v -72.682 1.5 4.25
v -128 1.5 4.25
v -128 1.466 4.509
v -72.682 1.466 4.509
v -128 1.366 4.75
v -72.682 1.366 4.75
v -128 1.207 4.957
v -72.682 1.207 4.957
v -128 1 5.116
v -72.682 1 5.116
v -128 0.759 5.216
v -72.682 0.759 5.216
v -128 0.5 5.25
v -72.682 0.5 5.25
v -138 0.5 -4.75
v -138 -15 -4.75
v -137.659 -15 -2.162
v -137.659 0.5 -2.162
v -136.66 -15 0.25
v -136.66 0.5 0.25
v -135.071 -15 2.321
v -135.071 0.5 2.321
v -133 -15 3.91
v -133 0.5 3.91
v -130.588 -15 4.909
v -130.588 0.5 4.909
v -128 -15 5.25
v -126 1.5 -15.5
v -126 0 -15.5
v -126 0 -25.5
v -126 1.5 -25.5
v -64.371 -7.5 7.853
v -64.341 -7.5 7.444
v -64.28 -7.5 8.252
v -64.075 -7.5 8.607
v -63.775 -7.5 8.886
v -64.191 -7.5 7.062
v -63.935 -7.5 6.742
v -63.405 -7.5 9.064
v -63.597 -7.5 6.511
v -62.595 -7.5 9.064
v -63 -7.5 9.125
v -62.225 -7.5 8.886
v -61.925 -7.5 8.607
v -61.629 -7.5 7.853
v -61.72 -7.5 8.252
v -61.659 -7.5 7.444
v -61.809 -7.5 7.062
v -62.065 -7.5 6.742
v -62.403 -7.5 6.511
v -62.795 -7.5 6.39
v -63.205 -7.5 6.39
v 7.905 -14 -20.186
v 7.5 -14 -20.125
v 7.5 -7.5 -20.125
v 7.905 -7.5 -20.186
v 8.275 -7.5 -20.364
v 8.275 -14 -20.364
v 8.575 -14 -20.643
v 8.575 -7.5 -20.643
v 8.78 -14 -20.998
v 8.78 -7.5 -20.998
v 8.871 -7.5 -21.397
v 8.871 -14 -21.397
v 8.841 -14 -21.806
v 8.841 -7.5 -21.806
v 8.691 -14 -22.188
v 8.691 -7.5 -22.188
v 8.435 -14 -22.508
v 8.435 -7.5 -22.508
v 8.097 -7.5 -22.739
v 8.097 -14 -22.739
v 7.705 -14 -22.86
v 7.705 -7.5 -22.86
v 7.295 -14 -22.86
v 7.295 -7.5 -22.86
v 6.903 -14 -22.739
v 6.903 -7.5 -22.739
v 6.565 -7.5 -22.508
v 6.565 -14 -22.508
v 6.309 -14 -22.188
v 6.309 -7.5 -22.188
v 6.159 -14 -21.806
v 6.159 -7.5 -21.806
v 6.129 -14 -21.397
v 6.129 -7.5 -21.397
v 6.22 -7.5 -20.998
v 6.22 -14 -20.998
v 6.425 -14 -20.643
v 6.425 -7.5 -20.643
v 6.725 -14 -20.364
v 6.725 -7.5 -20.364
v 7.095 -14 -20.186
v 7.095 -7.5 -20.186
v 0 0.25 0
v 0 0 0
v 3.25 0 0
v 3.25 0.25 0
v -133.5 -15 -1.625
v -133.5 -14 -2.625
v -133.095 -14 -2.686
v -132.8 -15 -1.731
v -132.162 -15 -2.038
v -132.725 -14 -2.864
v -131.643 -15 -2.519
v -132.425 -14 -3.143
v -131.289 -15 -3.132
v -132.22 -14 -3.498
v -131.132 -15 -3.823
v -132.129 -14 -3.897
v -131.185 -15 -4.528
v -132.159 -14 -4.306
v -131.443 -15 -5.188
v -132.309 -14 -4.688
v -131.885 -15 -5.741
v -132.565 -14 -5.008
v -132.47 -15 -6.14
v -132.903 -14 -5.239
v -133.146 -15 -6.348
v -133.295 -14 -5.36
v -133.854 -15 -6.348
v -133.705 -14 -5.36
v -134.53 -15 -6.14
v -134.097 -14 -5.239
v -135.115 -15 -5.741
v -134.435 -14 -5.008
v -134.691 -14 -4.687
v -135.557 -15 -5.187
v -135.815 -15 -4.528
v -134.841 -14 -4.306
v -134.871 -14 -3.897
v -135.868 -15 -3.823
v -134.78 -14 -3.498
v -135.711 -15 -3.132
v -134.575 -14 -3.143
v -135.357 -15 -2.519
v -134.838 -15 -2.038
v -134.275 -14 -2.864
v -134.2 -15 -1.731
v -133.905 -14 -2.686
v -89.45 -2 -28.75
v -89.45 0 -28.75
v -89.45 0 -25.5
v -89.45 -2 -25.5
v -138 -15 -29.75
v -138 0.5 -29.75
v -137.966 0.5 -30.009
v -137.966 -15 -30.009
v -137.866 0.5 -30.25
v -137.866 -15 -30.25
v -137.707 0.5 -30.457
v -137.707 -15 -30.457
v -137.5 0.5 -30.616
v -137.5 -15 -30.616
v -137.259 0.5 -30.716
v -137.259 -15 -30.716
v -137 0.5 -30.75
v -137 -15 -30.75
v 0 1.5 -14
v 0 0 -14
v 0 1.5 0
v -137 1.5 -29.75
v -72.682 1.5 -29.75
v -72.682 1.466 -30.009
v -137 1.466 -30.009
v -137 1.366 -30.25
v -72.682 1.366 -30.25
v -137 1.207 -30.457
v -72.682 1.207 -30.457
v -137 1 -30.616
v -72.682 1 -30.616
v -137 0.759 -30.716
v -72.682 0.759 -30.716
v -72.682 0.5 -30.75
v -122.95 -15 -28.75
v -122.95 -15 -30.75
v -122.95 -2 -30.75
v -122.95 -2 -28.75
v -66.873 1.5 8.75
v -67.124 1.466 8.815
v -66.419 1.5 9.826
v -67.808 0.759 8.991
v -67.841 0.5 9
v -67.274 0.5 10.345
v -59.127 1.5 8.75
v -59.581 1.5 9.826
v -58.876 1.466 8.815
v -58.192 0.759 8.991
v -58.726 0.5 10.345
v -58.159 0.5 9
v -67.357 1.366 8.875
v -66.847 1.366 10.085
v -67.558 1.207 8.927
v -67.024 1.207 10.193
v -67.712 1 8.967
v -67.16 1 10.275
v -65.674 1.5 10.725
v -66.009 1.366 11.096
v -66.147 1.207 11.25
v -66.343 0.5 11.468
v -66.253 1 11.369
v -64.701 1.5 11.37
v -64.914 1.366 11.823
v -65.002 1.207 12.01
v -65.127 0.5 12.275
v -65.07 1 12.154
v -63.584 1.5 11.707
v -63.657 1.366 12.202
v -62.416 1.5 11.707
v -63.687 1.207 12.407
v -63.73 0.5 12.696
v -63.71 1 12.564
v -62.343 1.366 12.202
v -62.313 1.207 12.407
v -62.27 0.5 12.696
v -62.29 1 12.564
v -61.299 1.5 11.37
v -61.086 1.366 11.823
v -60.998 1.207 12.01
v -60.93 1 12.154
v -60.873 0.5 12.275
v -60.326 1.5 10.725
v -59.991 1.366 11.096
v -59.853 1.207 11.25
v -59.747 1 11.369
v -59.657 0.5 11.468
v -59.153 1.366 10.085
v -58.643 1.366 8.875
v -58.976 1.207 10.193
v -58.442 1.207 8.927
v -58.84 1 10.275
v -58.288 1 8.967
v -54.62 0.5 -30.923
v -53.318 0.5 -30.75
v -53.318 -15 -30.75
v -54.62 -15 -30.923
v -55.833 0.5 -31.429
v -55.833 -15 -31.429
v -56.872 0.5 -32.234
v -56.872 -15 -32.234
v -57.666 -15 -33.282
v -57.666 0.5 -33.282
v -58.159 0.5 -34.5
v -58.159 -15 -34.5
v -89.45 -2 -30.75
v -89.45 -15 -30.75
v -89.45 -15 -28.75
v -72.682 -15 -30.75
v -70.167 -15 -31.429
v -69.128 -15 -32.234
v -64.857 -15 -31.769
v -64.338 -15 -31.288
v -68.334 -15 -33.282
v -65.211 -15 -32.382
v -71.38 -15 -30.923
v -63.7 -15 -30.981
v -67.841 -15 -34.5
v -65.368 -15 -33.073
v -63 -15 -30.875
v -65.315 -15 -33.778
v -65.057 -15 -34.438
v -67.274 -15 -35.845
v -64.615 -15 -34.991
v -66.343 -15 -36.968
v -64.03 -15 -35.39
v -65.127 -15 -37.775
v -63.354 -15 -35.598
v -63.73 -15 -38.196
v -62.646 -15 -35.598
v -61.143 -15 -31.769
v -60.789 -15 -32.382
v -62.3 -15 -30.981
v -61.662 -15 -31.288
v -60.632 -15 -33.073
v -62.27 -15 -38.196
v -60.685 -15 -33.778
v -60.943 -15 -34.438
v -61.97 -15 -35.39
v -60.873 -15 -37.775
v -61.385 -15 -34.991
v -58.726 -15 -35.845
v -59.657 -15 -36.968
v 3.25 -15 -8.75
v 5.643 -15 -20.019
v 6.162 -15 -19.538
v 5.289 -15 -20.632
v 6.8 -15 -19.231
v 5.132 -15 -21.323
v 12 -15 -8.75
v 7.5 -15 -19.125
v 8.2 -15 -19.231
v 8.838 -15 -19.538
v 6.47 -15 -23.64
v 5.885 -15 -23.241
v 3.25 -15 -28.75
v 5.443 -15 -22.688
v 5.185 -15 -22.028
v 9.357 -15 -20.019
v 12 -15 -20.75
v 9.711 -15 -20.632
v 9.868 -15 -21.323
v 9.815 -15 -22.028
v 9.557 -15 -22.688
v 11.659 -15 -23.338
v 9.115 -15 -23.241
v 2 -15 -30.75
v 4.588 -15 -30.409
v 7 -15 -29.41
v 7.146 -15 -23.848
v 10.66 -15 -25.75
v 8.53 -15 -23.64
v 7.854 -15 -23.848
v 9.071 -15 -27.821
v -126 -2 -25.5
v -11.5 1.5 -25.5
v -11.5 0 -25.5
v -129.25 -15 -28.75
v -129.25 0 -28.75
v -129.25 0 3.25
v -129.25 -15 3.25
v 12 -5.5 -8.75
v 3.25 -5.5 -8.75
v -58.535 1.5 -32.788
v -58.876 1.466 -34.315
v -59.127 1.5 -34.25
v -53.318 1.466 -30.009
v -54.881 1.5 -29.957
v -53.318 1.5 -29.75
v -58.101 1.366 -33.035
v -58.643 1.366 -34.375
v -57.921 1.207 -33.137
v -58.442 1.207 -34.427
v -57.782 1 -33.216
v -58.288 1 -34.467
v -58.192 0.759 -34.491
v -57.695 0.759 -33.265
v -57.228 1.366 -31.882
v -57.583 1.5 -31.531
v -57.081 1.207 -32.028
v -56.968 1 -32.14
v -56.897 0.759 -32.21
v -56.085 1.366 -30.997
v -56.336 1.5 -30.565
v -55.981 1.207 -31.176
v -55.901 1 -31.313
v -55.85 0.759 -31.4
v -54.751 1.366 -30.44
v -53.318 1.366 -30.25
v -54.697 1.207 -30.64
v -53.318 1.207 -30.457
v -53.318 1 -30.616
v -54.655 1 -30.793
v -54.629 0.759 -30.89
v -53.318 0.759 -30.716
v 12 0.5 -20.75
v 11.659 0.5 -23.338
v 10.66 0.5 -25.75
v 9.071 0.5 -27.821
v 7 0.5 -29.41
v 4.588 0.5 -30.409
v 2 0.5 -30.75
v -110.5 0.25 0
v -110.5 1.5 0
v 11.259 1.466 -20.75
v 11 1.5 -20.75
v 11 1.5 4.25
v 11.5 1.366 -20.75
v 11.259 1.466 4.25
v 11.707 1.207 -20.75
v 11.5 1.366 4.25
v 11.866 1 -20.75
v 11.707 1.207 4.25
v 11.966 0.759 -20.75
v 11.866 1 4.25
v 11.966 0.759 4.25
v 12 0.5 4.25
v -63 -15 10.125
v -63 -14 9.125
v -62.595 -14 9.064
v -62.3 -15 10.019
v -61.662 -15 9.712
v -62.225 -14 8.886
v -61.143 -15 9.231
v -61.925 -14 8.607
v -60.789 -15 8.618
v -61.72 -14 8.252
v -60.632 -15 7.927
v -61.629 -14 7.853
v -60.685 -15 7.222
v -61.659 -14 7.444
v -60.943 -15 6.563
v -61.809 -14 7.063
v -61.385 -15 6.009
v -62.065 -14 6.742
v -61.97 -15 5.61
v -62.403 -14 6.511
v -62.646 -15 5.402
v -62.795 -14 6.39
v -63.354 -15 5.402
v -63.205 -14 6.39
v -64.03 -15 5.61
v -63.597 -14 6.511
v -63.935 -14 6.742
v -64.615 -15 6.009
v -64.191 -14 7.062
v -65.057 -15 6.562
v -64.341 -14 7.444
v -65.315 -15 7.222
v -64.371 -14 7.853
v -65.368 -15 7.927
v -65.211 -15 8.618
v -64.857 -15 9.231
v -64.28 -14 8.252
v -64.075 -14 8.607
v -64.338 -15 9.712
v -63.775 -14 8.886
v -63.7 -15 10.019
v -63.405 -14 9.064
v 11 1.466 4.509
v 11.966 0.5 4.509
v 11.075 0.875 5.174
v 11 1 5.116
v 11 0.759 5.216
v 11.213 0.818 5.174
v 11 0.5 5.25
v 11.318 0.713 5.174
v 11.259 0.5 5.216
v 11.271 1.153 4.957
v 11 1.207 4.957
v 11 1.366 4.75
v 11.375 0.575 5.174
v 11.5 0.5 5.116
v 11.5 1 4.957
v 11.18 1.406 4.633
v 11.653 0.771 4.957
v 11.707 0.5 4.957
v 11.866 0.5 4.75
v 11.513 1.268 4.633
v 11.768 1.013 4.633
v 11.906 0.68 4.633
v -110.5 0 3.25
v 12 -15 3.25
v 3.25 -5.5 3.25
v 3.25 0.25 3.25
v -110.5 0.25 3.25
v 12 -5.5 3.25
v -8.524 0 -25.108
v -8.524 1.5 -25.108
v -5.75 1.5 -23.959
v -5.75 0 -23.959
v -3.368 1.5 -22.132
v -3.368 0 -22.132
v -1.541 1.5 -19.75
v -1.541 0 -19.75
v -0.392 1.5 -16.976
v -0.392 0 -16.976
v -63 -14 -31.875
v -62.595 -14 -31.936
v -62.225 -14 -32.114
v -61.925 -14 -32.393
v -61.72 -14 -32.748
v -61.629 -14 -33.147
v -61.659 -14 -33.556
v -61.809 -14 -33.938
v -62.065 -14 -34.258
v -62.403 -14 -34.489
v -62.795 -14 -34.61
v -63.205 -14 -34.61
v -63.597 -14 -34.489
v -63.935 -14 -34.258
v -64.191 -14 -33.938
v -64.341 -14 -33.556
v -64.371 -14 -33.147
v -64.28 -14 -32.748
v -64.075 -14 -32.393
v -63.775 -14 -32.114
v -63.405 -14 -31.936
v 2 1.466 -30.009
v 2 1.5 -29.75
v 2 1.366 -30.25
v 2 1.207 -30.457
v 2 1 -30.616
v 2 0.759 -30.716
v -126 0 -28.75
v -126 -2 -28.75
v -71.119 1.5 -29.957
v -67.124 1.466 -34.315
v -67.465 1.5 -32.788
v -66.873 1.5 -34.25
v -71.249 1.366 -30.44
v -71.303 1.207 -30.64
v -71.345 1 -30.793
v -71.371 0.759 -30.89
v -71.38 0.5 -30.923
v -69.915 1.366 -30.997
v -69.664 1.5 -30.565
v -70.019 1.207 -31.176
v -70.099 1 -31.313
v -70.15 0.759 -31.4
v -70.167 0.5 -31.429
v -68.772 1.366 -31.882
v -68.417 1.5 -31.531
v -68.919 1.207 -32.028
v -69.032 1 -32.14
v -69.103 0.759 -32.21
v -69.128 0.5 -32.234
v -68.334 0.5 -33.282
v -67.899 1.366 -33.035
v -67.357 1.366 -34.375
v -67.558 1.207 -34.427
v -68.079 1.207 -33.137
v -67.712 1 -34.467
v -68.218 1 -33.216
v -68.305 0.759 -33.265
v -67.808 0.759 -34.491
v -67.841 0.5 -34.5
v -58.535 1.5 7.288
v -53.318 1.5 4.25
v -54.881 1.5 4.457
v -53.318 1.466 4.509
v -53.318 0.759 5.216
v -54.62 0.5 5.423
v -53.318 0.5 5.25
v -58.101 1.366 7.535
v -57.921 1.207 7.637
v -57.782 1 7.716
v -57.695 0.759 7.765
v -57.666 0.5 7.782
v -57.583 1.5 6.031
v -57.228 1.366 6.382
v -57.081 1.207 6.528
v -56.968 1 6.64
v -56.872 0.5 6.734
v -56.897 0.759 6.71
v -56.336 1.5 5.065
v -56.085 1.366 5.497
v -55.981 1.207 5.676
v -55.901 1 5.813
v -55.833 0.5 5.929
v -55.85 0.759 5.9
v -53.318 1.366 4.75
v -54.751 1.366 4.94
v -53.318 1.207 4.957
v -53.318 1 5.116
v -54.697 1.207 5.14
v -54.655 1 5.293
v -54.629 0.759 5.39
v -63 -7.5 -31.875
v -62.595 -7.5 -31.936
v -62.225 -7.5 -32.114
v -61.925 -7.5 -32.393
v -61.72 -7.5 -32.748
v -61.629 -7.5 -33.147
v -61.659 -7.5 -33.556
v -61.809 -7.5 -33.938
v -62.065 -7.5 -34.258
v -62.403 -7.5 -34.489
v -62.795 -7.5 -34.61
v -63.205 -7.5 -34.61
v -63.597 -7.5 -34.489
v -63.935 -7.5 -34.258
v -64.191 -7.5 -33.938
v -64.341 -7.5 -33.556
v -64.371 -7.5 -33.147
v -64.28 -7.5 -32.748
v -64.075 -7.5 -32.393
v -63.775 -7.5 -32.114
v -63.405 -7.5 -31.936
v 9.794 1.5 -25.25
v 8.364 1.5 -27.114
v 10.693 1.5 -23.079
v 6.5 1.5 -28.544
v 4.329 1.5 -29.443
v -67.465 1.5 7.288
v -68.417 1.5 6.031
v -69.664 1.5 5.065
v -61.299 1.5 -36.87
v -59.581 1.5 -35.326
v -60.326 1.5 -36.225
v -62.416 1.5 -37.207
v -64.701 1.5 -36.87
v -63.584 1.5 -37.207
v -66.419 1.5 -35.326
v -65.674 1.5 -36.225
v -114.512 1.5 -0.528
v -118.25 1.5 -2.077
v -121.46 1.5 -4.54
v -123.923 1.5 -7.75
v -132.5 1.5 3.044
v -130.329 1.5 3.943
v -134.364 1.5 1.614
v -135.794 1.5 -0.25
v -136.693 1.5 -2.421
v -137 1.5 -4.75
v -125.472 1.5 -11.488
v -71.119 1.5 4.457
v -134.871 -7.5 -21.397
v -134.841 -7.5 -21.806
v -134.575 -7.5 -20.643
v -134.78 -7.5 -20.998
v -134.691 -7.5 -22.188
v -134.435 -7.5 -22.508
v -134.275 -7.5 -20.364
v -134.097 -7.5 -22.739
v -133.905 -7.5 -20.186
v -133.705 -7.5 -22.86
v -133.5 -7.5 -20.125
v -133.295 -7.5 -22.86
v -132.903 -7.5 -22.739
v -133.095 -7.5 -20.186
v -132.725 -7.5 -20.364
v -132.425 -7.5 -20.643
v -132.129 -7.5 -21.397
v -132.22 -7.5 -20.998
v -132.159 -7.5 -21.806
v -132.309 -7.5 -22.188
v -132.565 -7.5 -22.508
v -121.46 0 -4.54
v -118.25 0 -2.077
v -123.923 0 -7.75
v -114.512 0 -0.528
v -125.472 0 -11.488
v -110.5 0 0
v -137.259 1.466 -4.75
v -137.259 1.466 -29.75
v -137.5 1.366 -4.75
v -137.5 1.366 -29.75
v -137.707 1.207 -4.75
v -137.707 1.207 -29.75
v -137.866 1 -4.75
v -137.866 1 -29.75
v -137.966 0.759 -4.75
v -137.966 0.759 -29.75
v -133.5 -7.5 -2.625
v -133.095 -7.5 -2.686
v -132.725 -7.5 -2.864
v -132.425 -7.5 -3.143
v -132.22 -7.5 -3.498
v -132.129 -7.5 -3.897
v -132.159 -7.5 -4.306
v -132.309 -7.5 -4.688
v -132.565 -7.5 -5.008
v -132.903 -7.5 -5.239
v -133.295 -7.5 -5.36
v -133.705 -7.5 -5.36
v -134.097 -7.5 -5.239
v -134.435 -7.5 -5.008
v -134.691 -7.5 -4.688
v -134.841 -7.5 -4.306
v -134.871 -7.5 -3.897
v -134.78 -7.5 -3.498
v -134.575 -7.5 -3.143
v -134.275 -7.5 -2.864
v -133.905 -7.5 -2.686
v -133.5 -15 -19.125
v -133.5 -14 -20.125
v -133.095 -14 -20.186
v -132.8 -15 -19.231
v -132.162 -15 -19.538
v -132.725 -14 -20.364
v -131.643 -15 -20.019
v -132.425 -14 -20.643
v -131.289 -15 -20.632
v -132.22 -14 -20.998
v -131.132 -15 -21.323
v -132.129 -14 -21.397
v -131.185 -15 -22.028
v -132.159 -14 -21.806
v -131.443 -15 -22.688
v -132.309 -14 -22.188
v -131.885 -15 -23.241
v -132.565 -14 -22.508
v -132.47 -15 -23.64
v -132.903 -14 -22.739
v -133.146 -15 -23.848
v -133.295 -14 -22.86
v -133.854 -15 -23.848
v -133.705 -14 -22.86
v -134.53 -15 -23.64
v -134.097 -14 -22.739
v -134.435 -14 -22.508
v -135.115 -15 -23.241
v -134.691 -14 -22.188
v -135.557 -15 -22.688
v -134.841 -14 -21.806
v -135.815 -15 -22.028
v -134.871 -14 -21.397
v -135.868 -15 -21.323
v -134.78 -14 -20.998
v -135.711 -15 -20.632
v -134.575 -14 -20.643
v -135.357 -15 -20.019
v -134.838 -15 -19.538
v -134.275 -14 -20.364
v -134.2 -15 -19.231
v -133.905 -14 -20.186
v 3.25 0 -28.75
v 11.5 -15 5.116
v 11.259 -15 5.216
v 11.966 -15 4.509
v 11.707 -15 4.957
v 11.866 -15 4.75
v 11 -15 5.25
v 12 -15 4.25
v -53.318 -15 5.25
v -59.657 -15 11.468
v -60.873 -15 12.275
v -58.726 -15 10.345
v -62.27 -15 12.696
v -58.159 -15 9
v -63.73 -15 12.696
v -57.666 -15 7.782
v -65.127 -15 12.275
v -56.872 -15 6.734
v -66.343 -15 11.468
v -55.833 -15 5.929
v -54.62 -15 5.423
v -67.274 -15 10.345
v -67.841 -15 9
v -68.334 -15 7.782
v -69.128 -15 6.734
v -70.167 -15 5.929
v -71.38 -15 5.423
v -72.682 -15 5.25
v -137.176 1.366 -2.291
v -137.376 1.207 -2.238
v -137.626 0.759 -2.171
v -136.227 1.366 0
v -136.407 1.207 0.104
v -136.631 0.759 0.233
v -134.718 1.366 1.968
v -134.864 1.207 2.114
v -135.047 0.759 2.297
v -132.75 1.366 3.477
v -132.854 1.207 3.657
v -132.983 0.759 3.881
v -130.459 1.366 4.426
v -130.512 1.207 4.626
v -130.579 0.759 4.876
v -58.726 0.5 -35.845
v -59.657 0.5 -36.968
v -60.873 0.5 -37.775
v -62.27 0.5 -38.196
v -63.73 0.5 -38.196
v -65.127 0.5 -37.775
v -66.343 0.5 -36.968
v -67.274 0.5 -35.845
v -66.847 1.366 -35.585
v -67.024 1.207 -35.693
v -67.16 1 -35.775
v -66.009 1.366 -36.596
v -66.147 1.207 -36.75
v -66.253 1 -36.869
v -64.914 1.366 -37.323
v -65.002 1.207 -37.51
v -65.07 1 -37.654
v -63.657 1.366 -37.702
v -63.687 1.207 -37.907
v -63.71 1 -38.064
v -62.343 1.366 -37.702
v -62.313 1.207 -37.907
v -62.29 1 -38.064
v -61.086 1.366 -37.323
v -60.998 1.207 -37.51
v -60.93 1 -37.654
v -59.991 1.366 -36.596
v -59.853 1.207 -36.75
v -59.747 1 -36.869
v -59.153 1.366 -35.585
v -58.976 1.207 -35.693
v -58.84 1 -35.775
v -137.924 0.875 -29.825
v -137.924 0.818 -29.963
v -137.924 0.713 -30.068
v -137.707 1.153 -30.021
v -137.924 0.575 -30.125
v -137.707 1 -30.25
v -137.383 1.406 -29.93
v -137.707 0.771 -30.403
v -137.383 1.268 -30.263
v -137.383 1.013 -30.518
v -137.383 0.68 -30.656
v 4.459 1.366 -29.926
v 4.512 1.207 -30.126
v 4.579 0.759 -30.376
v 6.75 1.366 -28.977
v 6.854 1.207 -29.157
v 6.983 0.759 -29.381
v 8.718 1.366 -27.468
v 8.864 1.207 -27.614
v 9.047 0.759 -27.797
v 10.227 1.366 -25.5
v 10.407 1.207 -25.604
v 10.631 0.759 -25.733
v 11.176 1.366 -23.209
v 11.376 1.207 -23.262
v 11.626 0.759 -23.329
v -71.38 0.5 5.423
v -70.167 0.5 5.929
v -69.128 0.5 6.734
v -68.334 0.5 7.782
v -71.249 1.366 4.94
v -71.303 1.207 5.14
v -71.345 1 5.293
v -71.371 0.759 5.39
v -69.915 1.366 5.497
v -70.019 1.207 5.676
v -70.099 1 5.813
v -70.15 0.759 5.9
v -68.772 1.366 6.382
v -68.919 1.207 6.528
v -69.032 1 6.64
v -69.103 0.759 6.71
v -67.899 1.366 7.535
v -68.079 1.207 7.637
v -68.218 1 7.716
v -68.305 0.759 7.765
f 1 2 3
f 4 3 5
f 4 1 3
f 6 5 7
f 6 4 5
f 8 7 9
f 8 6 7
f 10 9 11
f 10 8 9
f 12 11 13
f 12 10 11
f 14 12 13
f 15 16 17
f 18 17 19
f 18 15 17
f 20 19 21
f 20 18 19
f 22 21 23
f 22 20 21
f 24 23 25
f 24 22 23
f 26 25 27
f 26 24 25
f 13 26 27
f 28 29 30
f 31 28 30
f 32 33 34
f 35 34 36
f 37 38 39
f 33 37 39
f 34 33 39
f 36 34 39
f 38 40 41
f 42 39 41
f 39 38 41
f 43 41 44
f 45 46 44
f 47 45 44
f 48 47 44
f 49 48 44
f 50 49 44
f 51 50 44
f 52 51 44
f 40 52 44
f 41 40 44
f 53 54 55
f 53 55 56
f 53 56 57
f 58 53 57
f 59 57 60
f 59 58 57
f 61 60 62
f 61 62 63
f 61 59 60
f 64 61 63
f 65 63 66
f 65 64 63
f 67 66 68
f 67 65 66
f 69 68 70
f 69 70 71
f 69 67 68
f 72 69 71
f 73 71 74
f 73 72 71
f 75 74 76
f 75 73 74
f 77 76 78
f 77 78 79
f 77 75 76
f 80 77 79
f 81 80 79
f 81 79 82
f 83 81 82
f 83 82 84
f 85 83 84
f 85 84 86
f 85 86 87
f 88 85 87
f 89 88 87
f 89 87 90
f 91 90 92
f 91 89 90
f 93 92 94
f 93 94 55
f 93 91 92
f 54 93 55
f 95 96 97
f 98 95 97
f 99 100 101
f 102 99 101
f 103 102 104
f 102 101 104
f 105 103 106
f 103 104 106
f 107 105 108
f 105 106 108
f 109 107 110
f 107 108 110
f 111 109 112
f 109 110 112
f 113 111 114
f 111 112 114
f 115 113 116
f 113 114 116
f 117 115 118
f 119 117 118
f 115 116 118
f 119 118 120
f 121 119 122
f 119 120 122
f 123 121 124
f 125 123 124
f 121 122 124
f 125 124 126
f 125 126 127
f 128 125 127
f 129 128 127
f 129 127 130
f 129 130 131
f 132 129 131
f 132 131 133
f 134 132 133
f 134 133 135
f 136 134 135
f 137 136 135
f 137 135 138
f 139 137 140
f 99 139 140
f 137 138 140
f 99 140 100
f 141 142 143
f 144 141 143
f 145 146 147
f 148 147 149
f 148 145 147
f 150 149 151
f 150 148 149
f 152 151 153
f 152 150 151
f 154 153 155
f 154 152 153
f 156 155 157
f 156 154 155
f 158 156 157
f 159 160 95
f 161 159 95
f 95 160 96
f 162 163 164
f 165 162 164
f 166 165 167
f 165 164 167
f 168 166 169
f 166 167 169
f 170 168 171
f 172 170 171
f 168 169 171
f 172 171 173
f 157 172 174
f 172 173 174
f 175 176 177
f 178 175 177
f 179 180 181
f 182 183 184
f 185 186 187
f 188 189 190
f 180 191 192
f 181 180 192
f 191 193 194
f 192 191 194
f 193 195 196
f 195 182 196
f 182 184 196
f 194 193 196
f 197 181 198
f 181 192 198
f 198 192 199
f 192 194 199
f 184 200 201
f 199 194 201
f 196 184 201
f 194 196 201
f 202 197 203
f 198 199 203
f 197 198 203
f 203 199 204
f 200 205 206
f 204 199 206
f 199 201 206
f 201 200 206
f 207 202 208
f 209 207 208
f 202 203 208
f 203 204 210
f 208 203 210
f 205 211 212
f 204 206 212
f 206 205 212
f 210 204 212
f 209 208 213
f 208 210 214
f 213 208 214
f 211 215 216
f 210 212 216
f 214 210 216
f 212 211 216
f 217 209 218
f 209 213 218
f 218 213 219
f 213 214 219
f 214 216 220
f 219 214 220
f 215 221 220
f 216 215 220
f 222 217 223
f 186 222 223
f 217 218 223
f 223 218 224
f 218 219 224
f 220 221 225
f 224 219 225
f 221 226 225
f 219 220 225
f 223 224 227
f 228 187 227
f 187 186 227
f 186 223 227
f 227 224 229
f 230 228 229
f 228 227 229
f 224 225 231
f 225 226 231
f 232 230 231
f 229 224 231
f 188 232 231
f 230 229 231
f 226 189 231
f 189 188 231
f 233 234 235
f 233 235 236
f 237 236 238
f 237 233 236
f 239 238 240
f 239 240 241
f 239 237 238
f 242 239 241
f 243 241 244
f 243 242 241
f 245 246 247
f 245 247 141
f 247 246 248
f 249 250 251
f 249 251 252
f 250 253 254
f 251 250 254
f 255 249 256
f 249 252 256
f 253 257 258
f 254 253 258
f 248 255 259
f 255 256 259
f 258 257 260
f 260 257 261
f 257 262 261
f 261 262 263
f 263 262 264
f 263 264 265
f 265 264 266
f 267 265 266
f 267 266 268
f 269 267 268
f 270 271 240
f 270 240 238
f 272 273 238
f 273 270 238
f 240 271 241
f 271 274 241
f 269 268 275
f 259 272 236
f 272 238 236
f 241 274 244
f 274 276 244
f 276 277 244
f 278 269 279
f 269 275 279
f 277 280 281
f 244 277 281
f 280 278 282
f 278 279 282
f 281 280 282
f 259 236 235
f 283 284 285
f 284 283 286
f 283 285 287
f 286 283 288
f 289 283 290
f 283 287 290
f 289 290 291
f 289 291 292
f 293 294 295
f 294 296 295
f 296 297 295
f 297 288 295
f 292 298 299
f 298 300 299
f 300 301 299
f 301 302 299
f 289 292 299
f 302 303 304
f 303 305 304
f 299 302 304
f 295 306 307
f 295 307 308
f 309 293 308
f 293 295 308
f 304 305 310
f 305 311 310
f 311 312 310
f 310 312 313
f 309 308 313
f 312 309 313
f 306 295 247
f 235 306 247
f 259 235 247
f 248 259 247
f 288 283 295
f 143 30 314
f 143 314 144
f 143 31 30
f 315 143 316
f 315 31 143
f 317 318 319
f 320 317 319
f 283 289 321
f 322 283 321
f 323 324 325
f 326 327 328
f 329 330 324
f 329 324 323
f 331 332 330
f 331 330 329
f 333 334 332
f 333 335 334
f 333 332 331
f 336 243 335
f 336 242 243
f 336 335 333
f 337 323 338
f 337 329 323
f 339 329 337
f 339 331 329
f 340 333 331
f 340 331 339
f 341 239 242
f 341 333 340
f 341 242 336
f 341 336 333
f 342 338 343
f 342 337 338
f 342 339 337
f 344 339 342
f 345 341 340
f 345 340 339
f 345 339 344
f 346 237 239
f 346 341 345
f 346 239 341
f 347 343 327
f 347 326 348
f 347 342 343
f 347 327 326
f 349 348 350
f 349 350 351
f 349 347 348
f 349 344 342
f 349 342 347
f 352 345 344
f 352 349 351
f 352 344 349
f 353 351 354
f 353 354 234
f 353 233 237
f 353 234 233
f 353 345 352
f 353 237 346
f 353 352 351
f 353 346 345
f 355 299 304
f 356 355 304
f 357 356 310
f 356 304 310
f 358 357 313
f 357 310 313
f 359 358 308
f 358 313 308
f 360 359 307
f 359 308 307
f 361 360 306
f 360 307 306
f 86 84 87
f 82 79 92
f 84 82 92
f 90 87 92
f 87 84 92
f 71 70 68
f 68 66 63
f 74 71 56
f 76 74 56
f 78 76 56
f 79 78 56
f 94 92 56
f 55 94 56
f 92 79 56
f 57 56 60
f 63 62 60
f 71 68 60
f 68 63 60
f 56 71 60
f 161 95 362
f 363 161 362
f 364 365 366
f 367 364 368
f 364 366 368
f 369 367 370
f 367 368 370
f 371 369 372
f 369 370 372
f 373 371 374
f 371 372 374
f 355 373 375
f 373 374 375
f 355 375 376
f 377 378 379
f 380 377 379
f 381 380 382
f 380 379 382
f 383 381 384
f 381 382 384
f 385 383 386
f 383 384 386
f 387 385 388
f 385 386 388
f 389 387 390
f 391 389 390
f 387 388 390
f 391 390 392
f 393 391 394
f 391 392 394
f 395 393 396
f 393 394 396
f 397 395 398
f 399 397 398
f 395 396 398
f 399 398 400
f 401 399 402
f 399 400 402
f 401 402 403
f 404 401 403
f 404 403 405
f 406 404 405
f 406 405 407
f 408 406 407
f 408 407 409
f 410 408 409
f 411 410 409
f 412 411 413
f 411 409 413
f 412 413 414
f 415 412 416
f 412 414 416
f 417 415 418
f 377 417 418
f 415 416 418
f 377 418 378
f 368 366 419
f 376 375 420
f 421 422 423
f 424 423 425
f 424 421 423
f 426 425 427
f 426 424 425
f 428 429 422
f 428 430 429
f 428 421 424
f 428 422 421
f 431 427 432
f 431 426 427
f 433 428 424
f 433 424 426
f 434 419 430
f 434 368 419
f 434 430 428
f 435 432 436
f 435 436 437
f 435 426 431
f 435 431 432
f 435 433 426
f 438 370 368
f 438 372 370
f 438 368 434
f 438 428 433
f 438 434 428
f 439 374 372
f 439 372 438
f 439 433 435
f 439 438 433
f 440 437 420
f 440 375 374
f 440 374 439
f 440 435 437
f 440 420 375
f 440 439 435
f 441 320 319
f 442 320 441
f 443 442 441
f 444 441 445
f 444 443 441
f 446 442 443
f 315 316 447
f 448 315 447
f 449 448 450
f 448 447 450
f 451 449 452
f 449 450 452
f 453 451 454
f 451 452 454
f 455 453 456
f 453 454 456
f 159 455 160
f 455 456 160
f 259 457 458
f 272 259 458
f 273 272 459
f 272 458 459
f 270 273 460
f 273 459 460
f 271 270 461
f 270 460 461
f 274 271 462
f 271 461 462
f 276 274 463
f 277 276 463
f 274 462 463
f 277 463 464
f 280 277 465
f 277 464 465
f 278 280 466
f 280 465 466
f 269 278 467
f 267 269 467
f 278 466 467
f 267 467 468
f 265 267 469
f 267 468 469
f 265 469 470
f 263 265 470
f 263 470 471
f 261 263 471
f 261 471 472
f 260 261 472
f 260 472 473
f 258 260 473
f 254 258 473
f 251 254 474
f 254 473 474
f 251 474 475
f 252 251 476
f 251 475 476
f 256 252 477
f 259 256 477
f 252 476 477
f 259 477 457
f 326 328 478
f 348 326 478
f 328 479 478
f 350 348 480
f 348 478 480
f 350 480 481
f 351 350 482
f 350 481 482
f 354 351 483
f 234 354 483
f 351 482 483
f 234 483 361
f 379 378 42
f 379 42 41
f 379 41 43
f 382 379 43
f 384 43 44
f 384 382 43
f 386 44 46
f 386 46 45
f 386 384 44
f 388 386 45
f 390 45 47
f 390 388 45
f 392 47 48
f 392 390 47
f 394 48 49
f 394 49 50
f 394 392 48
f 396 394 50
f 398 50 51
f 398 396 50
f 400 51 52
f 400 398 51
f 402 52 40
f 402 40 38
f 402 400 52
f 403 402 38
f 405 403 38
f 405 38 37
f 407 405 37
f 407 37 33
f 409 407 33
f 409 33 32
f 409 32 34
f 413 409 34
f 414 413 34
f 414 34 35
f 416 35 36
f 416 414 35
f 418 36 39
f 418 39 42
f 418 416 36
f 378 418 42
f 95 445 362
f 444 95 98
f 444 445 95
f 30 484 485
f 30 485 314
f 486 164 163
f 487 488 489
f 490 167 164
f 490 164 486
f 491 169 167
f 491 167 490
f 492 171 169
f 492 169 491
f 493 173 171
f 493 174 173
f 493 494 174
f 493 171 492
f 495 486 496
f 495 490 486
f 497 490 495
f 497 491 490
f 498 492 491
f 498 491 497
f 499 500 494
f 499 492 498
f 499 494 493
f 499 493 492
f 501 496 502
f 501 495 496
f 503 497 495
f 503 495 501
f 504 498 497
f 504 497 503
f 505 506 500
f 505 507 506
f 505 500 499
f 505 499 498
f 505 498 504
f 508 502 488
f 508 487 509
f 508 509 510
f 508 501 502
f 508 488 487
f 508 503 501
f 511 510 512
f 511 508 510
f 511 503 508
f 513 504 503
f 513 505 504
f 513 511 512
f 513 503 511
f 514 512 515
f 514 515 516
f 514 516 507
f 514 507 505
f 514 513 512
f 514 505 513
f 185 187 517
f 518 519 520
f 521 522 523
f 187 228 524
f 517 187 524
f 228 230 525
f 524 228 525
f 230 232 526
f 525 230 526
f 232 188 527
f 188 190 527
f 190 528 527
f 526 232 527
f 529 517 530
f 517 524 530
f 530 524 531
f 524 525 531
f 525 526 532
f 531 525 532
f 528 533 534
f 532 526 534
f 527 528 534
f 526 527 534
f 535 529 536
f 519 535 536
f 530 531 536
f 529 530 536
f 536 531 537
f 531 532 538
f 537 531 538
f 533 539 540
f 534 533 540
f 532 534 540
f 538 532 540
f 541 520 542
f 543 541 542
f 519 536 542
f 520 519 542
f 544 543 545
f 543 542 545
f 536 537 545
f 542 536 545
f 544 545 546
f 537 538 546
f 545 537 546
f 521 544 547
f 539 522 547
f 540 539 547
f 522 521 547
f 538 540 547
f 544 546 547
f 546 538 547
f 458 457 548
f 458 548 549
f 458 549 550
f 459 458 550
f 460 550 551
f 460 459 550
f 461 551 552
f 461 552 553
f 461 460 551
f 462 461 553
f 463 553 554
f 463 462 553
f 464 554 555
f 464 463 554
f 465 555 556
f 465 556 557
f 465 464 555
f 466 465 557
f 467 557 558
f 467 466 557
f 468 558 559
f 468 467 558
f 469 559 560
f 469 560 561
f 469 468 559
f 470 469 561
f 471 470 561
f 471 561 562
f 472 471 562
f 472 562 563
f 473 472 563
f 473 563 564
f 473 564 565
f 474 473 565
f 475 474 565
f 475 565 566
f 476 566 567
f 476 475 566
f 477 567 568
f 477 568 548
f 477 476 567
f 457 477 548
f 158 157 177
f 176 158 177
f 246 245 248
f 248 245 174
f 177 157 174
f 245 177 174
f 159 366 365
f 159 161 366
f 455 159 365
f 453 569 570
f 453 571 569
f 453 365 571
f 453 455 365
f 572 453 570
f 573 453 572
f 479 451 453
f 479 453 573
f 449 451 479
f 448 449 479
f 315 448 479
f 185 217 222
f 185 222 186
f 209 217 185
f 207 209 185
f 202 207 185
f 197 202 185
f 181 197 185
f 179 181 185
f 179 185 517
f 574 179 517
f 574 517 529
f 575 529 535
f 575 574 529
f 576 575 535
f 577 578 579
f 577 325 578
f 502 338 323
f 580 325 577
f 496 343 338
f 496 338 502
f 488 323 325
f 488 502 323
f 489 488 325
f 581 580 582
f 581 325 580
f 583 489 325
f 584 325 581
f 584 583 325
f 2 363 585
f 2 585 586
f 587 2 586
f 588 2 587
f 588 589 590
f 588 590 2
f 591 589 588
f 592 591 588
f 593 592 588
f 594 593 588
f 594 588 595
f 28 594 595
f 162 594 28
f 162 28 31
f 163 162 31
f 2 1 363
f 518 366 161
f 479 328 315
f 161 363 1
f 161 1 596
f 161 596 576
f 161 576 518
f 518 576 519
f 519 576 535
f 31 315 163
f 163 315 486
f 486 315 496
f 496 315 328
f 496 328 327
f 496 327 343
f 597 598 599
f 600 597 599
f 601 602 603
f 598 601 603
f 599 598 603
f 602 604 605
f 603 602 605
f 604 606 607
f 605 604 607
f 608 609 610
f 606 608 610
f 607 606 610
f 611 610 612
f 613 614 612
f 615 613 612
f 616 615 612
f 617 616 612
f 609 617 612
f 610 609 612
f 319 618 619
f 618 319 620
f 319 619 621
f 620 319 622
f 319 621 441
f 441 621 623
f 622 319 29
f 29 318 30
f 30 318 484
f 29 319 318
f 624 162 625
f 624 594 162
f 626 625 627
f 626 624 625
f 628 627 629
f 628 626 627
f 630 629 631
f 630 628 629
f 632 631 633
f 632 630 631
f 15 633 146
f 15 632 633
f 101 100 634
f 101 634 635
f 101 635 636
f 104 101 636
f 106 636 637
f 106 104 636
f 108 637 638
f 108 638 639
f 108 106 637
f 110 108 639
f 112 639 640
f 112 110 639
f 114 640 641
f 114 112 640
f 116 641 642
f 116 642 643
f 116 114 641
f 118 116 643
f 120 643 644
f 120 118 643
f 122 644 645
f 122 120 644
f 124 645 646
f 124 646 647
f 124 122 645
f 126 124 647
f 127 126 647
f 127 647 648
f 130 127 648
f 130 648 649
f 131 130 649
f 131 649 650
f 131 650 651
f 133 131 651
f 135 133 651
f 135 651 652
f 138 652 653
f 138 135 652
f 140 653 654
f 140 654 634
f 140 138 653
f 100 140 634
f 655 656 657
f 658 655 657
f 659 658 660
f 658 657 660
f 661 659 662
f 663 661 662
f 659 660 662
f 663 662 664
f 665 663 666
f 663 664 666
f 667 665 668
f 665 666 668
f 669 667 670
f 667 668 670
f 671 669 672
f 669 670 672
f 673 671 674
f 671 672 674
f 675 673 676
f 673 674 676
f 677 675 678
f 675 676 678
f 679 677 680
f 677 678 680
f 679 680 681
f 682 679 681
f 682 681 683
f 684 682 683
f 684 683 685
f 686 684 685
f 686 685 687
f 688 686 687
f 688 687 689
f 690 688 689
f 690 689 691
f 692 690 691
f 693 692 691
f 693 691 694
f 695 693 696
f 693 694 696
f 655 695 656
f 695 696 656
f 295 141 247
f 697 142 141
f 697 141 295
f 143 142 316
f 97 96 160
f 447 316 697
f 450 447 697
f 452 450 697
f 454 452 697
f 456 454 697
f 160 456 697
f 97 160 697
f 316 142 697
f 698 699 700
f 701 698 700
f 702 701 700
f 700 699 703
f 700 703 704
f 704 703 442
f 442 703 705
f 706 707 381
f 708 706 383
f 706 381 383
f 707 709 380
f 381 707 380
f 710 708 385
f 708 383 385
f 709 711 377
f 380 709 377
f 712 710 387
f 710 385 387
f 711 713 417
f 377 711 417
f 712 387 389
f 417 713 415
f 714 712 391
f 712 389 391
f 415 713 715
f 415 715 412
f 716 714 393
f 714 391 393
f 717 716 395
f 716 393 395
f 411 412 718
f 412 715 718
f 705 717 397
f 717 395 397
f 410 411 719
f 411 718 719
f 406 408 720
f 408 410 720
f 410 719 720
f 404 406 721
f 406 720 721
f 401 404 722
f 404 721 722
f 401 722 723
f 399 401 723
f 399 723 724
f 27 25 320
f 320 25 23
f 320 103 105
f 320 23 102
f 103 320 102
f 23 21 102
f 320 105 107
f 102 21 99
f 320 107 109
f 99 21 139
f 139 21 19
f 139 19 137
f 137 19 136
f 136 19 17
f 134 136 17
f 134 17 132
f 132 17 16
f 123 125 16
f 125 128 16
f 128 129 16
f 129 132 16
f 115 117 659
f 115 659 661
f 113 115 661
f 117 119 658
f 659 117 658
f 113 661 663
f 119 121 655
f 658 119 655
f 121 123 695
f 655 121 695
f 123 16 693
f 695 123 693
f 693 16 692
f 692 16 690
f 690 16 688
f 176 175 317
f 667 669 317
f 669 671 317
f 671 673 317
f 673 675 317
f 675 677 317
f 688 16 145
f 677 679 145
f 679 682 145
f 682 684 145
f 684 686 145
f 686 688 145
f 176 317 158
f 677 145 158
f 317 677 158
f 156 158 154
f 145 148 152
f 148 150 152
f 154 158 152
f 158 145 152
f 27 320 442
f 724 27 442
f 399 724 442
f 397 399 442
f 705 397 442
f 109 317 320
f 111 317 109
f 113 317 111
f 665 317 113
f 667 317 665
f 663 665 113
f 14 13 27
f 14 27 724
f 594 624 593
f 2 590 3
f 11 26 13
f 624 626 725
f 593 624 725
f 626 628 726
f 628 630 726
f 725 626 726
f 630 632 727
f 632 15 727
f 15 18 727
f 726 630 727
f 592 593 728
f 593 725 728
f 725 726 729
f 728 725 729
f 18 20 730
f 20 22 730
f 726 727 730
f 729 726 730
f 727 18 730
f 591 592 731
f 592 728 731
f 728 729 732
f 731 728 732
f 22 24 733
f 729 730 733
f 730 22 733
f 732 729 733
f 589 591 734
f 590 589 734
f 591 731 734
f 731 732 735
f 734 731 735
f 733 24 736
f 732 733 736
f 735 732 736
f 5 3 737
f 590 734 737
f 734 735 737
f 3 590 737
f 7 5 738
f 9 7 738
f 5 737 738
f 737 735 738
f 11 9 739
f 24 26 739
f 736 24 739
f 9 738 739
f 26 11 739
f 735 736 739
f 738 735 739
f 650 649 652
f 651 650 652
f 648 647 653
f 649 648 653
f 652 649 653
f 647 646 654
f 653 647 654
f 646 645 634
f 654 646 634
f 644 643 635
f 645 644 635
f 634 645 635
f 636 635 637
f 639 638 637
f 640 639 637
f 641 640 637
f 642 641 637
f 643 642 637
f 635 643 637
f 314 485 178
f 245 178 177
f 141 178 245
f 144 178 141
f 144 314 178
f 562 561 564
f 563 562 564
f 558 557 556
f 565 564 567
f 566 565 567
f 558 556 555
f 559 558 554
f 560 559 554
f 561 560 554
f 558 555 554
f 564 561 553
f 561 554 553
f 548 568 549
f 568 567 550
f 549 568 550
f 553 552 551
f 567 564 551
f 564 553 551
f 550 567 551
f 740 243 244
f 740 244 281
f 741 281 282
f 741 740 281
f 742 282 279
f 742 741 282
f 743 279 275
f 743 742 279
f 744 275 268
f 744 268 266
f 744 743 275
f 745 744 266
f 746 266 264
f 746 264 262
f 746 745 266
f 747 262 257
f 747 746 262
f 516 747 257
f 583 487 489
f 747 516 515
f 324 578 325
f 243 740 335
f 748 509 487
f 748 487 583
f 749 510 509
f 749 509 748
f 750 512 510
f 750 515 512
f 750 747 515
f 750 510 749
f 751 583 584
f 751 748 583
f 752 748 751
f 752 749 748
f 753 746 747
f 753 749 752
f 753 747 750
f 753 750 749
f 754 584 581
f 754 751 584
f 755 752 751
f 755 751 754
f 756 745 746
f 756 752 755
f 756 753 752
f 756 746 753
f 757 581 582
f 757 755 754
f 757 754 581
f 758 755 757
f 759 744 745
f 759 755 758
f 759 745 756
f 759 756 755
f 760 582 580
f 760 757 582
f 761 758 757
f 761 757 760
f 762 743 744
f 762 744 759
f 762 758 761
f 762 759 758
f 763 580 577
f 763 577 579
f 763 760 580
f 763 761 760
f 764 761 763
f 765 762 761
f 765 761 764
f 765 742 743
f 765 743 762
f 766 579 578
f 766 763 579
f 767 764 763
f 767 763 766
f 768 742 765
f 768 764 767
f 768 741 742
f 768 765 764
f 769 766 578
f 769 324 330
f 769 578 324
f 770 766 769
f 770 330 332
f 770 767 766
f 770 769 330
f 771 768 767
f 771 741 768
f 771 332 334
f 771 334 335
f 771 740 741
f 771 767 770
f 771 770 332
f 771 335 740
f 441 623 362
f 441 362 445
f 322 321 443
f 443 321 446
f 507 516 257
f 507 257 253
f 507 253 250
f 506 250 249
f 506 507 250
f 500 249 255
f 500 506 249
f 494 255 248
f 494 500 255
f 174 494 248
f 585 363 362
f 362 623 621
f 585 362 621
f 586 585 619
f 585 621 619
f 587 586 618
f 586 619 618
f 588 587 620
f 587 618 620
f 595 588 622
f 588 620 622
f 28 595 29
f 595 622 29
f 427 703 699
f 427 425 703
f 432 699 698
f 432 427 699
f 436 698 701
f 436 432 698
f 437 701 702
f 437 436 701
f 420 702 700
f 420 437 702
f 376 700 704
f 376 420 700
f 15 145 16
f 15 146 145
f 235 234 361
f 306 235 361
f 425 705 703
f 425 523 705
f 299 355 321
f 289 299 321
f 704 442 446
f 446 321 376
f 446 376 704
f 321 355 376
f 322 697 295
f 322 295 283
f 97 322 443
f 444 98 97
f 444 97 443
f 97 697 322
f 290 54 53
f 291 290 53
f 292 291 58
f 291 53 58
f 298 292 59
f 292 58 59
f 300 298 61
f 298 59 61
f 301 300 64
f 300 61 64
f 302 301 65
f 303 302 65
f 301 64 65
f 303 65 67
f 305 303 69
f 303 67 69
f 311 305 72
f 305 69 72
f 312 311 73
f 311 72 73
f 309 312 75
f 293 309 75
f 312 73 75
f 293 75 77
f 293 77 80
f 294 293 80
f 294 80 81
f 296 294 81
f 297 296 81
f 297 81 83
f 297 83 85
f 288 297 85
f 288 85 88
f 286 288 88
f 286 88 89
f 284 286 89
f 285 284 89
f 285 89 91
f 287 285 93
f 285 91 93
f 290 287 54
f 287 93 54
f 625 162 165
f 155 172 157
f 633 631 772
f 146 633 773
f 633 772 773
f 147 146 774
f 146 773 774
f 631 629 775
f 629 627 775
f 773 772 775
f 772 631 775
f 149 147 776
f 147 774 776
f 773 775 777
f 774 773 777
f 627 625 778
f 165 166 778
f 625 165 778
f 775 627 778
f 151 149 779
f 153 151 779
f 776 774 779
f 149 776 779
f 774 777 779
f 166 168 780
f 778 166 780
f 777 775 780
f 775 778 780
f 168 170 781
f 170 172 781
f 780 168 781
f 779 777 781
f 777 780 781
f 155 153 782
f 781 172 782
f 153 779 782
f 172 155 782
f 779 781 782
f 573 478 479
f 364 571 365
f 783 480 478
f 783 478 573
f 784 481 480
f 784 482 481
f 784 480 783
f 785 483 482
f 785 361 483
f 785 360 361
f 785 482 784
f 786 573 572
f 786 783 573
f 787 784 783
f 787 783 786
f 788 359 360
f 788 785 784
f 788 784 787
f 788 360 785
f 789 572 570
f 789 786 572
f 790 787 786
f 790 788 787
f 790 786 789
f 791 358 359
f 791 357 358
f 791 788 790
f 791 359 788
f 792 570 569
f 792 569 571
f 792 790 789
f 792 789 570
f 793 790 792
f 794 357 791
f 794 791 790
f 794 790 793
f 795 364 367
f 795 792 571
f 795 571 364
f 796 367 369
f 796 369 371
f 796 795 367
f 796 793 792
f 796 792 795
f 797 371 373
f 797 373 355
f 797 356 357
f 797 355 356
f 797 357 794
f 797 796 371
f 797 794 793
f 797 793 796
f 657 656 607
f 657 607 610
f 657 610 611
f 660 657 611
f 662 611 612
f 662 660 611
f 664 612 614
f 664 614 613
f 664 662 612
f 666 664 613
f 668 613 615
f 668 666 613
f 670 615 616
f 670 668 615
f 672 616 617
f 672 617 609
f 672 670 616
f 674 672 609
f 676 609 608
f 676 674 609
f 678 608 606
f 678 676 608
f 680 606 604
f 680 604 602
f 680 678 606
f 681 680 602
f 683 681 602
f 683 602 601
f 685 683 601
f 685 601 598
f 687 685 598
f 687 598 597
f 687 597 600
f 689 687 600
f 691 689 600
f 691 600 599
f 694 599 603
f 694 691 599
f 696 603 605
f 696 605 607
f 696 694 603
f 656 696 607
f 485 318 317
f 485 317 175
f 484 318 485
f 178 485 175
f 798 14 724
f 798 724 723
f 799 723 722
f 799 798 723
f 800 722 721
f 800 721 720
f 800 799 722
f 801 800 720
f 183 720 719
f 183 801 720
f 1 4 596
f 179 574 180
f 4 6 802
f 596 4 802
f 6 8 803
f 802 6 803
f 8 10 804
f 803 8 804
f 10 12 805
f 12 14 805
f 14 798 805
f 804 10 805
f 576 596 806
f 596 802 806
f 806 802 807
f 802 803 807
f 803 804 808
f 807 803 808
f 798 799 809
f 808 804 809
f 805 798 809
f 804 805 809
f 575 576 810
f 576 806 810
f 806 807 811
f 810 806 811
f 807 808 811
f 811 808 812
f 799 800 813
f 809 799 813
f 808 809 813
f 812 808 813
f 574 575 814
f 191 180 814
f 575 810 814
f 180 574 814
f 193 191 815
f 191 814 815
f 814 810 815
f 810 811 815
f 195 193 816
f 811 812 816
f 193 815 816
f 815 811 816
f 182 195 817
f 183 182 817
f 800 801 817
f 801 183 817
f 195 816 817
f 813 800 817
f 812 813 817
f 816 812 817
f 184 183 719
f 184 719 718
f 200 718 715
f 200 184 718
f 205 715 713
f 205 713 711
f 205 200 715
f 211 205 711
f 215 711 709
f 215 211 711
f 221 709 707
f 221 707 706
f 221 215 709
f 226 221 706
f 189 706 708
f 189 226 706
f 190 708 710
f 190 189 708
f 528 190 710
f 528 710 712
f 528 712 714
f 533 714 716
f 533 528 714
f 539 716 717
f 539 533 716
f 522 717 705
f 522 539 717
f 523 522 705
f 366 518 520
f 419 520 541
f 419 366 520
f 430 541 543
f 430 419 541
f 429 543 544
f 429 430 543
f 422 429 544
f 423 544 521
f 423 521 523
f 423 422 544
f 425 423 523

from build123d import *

# Parameters (mm, degrees)
SKETCH1_W           = 150
SKETCH1_H           = 36
BOSS_EXTRUDE1_DEPTH = 1.5
SKETCH2_W           = 150
SKETCH2_H           = 36
SKETCH2_W_2         = 132.5
SKETCH2_H_2         = 32
BOSS_EXTRUDE2_DEPTH = 15
SKETCH3_W           = 12
SKETCH3_H           = 9.5
CUT_EXTRUDE1_DEPTH  = 8.75
SKETCH4_W           = 33.5
SKETCH4_H           = 13
CUT_EXTRUDE2_DEPTH  = 2
BOSS_EXTRUDE4_DEPTH = 16.5
FILLET1_R           = 10
SKETCH5_R           = 1.375
CUT_EXTRUDE3_DEPTH  = 7.5
SKETCH8_W           = 36.55
SKETCH8_H           = 3.25
BOSS_EXTRUDE3_DEPTH = 2
FILLET2_R           = 5
FILLET3_R           = 1
CHAMFER1_SIZE       = 1
SKETCH10_W          = 113.75
SKETCH10_H          = 3.25
CUT_EXTRUDE4_DEPTH  = 0.25


with BuildPart() as part:
    # Sketch1 → Boss-Extrude1 (new body)
    with BuildSketch(Plane(origin=(0, 0, 0), x_dir=(1, 0, 0), z_dir=(0, 1, 0))):
        with Locations((-63, 12.75)):
            Rectangle(SKETCH1_W, SKETCH1_H)
        with BuildLine():
            Line((0, 0), (-110.5, 0))
            ThreePointArc((-110.5, 0), (-121.460155108, 4.539844892), (-126, 15.5))
            Line((-126, 15.5), (-126, 25.5))
            Line((-126, 25.5), (-11.5, 25.5))
            ThreePointArc((-11.5, 25.5), (-3.368272016, 22.131727984), (0, 14))
            Line((0, 14), (0, 0))
        make_face(mode=Mode.SUBTRACT)
    extrude(amount=BOSS_EXTRUDE1_DEPTH)

    # Sketch2 → Boss-Extrude2 (add)
    with BuildSketch(Plane.XZ):
        with Locations((-63, -12.75)):
            Rectangle(SKETCH2_W, SKETCH2_H)
        with Locations((-63, -12.75)):
            Rectangle(SKETCH2_W_2, SKETCH2_H_2, mode=Mode.SUBTRACT)
    extrude(amount=BOSS_EXTRUDE2_DEPTH)

    # Sketch3 → Cut-Extrude1 (cut)
    with BuildSketch(Plane.ZY.offset(-12)):
        with Locations((-2.75, -10.25)):
            Rectangle(SKETCH3_W, SKETCH3_H)
    extrude(amount=CUT_EXTRUDE1_DEPTH, mode=Mode.SUBTRACT)

    # Sketch4 → Cut-Extrude2 (cut)
    with BuildSketch(Plane.XY.offset(-30.75)):
        with Locations((-106.2, -8.5)):
            Rectangle(SKETCH4_W, SKETCH4_H)
    extrude(amount=CUT_EXTRUDE2_DEPTH, mode=Mode.SUBTRACT)

    # Sketch9 → Boss-Extrude4 (add)
    with BuildSketch(Plane(origin=(0, 1.5, 0), x_dir=(1, 0, 0), z_dir=(0, 1, 0))):
        with BuildLine():
            Line((-68, 33.25), (-68, 30.75))
            Line((-68, 30.75), (-58, 30.75))
            Line((-58, 30.75), (-58, 33.25))
            ThreePointArc((-58, 33.25), (-63, 38.25), (-68, 33.25))
        make_face()
        with BuildLine():
            Line((-58, -7.75), (-58, -5.25))
            Line((-58, -5.25), (-68, -5.25))
            Line((-68, -5.25), (-68, -7.75))
            ThreePointArc((-68, -7.75), (-63, -12.75), (-58, -7.75))
        make_face()
    extrude(amount=-BOSS_EXTRUDE4_DEPTH)

    # Fillet1
    fillet1_edges = [part.edges().sort_by_distance(p)[0] for p in [
        (12, -6.75, -30.75),
        (-138, -6.75, 5.25),
    ]]
    fillet(fillet1_edges, radius=FILLET1_R)

    # Sketch5 → Cut-Extrude3 (cut)
    with BuildSketch(Plane(origin=(0, -15, 0), x_dir=(1, 0, 0), z_dir=(0, 1, 0))):
        with Locations(Location((7.5, 21.5, 0), (0, 0, 270))):
            Circle(SKETCH5_R)
        with Locations((7.5, 4)):
            Circle(SKETCH5_R)
        with Locations(Location((-133.5, 4, 0), (0, 0, 270))):
            Circle(SKETCH5_R)
        with Locations(Location((-133.5, 21.5, 0), (0, 0, 270))):
            Circle(SKETCH5_R)
        with Locations(Location((-63, -7.75, 0), (0, 0, 270))):
            Circle(SKETCH5_R)
        with Locations(Location((-63, 33.25, 0), (0, 0, 270))):
            Circle(SKETCH5_R)
    extrude(amount=CUT_EXTRUDE3_DEPTH, mode=Mode.SUBTRACT)

    # Sketch8 → Boss-Extrude3 (add)
    with BuildSketch(Plane.XZ):
        with Locations((-107.725, -27.125)):
            Rectangle(SKETCH8_W, SKETCH8_H)
    extrude(amount=BOSS_EXTRUDE3_DEPTH)

    # Fillet2
    # the kernel refuses this fillet: 5 mm, written as the material it adds along each edge
    with BuildSketch(Plane(origin=(-58, 1.5, -30.75), x_dir=(1, 0, 0), z_dir=(0, -1, 0)), Plane(origin=(-68, 1.5, 5.25), x_dir=(-1, 0, 0), z_dir=(0, -1, 0))) as fillet2_piece_1:
        with BuildLine():
            CenterArc((4.682458366, -5), FILLET2_R, 90, 75.522487814)
            Line((-0.158770817, -3.75), (-0.642893736, -3.625))
            ThreePointArc((-0.642893736, -3.625), (-0.5, -2.5), (-0.5, 0))
            Line((-0.5, 0), (0, 0.5))
            Line((0, 0.5), (4.682458366, 0.5))
            Line((4.682458366, 0.5), (4.682458366, 0))
        make_face()
    extrude(amount=16.5)
    with BuildSketch(Plane(origin=(-68, 1.5, -30.75), x_dir=(-1, 0, 0), z_dir=(0, -1, 0))) as fillet2_piece_2:
        with BuildLine():
            CenterArc((4.682458366, 5), FILLET2_R, 194.477512186, 75.522487814)
            Line((-0.158770817, 3.75), (-0.642893736, 3.625))
            ThreePointArc((-0.642893736, 3.625), (-0.5, 2.5), (-0.5, 0))
            Line((-0.5, 0), (0, -0.5))
            Line((0, -0.5), (4.682458366, -0.5))
            Line((4.682458366, -0.5), (4.682458366, 0))
        make_face()
    extrude(amount=16.5)
    with BuildSketch(Plane(origin=(-58, 1.5, 5.25), x_dir=(-0.0423009875968097, 0, 0.9991049126334705), z_dir=(0, -1, 0))) as fillet2_piece_3:
        with BuildLine():
            CenterArc((4.79745195, -4.889772094), FILLET2_R, 102.053120737, 75.522487814)
            Line((-0.198072613, -4.678267156), (-0.69762507, -4.657116662))
            Line((-0.69762507, -4.657116662), (-0.499552456, 0.021150494))
            Line((-0.499552456, 0.021150494), (0.021150494, 0.499552456))
            ThreePointArc((0.021150494, 0.499552456), (2.518912775, 0.393799987), (3.648950348, 0.488977209))
            Line((3.648950348, 0.488977209), (3.753359585, 0))
        make_face()
    extrude(amount=16.5)
    # the kernel refuses this fillet: 5 mm, written as the material it takes off along each edge

    # Fillet3
    fillet3_edges = [part.edges().sort_by_distance(p)[0] for p in [
        (-25.658770817, 1.5, -30.75),
        (-100.341229183, 1.5, 5.25),
        (-135.071067812, 1.5, 2.321067812),
        (9.071067812, 1.5, -27.821067812),
        (12, 1.5, -7.75),
        (-63, 1.5, 12.75),
        (-20.658770817, 1.5, 5.25),
        (-63, 1.5, -38.25),
        (-105.341229183, 1.5, -30.75),
        (-56.379403813, 1.5, 6.297152925),
        (-69.620596187, 1.5, 6.297152925),
        (-56.379403813, 1.5, -31.797152925),
        (-69.620596187, 1.5, -31.797152925),
        (-138, 1.5, -17.75),
        (-138, -6.75, -30.75),
        (12, -6.75, 5.25),
    ]]
    fillet(fillet3_edges, radius=FILLET3_R)

    # Chamfer1
    chamfer1_edges = [part.edges().sort_by_distance(p)[0] for p in [
        (-63, -15, -34.625),
        (-133.5, -15, -5.375),
        (-133.5, -15, -22.875),
        (-63, -15, 6.375),
        (7.5, -15, -22.875),
    ]]
    chamfer(chamfer1_edges, length=CHAMFER1_SIZE)

    # Sketch10 → Cut-Extrude4 (cut)
    with BuildSketch(Plane.XZ):
        with Locations((-53.625, 1.625)):
            Rectangle(SKETCH10_W, SKETCH10_H)
    extrude(amount=-CUT_EXTRUDE4_DEPTH, mode=Mode.SUBTRACT)


solid = part.part
